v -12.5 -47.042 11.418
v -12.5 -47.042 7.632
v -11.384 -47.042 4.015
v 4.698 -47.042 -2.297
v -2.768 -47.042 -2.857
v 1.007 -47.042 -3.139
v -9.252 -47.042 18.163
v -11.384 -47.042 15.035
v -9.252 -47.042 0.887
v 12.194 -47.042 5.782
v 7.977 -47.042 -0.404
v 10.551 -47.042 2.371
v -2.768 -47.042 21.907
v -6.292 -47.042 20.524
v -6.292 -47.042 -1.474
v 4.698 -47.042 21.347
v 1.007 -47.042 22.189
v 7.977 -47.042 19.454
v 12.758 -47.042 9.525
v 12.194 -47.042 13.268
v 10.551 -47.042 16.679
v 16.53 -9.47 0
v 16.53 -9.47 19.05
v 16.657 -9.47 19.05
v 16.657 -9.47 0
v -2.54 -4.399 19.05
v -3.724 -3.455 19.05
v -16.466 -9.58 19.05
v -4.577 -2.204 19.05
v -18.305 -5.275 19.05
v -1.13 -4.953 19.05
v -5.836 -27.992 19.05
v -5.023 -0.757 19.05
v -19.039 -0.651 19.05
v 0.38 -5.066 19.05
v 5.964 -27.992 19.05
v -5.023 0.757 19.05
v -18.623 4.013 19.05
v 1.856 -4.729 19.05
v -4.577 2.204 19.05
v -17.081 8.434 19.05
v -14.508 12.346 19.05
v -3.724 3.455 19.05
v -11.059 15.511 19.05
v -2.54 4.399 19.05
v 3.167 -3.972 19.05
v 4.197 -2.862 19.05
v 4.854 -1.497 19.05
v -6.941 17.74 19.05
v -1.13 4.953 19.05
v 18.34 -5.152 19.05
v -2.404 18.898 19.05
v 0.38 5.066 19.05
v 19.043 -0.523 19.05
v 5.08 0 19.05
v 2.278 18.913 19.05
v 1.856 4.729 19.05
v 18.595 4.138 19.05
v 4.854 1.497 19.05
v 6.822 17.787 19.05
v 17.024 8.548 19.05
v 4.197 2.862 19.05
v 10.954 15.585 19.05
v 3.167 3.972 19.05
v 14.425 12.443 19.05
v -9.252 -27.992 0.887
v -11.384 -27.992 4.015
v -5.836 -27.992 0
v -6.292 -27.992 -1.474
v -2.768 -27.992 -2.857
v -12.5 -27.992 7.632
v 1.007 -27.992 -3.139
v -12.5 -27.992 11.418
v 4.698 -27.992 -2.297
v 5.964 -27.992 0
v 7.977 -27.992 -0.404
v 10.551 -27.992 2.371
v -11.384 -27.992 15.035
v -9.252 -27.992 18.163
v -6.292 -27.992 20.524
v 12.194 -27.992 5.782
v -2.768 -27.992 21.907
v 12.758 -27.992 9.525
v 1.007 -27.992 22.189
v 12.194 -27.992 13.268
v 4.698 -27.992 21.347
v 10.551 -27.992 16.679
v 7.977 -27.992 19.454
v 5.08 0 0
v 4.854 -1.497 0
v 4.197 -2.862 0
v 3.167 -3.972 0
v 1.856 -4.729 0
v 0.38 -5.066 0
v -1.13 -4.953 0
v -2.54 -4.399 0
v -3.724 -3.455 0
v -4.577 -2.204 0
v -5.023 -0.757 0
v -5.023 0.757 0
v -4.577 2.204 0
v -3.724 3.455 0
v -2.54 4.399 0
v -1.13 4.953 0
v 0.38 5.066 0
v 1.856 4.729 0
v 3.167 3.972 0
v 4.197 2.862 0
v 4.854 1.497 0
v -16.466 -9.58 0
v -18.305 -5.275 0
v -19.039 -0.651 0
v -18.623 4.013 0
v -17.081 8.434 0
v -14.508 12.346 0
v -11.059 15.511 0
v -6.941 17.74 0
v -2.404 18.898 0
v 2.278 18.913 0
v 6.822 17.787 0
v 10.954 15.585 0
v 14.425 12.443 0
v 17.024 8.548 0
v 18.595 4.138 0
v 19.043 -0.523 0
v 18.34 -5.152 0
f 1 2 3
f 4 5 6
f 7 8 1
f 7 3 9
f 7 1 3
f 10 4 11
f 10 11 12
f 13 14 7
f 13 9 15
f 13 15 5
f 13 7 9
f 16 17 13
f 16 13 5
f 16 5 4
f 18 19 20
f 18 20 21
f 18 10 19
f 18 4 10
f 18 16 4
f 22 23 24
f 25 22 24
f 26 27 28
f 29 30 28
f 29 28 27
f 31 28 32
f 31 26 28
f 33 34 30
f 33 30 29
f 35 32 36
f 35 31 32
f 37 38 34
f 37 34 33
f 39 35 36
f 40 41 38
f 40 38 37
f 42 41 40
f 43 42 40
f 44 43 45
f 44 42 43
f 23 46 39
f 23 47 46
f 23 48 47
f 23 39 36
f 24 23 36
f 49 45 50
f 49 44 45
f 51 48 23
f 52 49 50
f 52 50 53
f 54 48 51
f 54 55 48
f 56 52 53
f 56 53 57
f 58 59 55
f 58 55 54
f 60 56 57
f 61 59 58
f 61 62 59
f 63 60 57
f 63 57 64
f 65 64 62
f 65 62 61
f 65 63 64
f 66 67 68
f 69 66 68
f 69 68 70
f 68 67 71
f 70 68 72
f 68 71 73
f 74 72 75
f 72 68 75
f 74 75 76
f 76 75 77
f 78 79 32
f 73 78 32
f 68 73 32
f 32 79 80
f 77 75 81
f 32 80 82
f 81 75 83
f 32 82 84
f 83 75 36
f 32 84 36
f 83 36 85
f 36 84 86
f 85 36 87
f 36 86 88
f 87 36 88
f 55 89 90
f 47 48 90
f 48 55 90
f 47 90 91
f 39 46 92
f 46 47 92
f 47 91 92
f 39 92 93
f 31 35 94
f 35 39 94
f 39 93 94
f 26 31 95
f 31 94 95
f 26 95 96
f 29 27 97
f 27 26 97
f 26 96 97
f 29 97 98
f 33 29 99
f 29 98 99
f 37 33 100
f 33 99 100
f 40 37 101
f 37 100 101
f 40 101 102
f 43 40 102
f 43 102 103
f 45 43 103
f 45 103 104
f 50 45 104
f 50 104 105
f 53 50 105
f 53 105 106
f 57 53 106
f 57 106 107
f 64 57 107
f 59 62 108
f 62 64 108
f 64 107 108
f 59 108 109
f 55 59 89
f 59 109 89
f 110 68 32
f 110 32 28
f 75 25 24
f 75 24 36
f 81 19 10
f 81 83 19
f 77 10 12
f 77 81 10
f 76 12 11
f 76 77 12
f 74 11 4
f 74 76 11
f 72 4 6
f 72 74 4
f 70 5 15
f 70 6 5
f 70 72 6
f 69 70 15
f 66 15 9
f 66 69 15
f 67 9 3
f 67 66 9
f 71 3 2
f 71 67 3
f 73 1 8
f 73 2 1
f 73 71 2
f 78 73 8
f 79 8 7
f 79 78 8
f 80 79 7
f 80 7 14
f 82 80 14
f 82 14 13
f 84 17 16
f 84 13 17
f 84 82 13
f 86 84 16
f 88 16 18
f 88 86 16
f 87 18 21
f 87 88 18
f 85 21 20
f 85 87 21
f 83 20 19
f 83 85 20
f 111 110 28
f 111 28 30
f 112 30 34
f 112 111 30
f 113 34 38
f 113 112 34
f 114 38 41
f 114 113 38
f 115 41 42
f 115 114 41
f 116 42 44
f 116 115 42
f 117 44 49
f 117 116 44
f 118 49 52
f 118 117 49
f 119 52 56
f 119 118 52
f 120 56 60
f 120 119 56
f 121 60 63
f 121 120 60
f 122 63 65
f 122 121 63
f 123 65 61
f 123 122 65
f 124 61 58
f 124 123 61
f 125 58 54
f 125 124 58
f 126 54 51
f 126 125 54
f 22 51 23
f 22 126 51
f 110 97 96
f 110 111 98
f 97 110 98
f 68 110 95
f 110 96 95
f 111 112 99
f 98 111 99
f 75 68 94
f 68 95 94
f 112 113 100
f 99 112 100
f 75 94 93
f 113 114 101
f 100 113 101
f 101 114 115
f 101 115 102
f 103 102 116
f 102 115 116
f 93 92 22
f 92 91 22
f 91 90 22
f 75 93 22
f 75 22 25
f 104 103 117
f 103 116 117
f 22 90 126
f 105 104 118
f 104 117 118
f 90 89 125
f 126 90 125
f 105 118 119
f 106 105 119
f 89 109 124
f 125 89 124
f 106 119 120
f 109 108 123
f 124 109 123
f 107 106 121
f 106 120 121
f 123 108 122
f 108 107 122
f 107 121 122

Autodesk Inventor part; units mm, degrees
ref_plane "YZ Plane" through (0, 0, 0) normal (1, 0, 0) x (0, 1, 0)
ref_plane "XZ Plane" through (0, 0, 0) normal (0, 1, 0) x (-1, 0, 0)
ref_plane "XY Plane" through (0, 0, 0) normal (0, 0, 1) x (1, 0, 0)
sketch "Sketch1" plane through (0, 0, 0) normal (0, 0, 1) x (1, 0, 0)
  arc A0 (16.5296, -9.4696) -> (-16.4657, -9.5803) centre (0, 0) ccw
  circle A1 centre (0, 0) radius 5.08
  line L0 (16.5296, -9.4696) -> (16.6574, -9.4696)
  line L1 (16.6574, -9.4696) -> (5.9637, -27.9917)
  line L2 (-5.8359, -27.9917) -> (-16.5296, -9.4696)
  line L3 (-5.8359, -27.9917) -> (5.9637, -27.9917)
  point P0 (0.0639, -19.0499)
  dimension "d0" = 38.1
  dimension "d1" = 10.16
extrude "Extrusion1" add sketch "Sketch1" along normal blind 19.05
sketch "Sketch2" plane through (-5.8359, -27.9917, 0) normal (0, -1, 0) x (1, 0, 0)
  circle A0 centre (5.8941, 9.525) radius 12.7
  line L0 (11.7996, 0) -> (11.7996, 19.05) projected
  line L1 (0, 0) -> (11.7996, 0) projected
  point P0 (5.8359, 0)
  dimension "d4" = 25.4
  dimension "d5" = 5.9055
  dimension "d6" = 9.525
extrude "Extrusion2" add sketch "Sketch2" along normal blind 19.05
properties part number "Load Notch Insert"
